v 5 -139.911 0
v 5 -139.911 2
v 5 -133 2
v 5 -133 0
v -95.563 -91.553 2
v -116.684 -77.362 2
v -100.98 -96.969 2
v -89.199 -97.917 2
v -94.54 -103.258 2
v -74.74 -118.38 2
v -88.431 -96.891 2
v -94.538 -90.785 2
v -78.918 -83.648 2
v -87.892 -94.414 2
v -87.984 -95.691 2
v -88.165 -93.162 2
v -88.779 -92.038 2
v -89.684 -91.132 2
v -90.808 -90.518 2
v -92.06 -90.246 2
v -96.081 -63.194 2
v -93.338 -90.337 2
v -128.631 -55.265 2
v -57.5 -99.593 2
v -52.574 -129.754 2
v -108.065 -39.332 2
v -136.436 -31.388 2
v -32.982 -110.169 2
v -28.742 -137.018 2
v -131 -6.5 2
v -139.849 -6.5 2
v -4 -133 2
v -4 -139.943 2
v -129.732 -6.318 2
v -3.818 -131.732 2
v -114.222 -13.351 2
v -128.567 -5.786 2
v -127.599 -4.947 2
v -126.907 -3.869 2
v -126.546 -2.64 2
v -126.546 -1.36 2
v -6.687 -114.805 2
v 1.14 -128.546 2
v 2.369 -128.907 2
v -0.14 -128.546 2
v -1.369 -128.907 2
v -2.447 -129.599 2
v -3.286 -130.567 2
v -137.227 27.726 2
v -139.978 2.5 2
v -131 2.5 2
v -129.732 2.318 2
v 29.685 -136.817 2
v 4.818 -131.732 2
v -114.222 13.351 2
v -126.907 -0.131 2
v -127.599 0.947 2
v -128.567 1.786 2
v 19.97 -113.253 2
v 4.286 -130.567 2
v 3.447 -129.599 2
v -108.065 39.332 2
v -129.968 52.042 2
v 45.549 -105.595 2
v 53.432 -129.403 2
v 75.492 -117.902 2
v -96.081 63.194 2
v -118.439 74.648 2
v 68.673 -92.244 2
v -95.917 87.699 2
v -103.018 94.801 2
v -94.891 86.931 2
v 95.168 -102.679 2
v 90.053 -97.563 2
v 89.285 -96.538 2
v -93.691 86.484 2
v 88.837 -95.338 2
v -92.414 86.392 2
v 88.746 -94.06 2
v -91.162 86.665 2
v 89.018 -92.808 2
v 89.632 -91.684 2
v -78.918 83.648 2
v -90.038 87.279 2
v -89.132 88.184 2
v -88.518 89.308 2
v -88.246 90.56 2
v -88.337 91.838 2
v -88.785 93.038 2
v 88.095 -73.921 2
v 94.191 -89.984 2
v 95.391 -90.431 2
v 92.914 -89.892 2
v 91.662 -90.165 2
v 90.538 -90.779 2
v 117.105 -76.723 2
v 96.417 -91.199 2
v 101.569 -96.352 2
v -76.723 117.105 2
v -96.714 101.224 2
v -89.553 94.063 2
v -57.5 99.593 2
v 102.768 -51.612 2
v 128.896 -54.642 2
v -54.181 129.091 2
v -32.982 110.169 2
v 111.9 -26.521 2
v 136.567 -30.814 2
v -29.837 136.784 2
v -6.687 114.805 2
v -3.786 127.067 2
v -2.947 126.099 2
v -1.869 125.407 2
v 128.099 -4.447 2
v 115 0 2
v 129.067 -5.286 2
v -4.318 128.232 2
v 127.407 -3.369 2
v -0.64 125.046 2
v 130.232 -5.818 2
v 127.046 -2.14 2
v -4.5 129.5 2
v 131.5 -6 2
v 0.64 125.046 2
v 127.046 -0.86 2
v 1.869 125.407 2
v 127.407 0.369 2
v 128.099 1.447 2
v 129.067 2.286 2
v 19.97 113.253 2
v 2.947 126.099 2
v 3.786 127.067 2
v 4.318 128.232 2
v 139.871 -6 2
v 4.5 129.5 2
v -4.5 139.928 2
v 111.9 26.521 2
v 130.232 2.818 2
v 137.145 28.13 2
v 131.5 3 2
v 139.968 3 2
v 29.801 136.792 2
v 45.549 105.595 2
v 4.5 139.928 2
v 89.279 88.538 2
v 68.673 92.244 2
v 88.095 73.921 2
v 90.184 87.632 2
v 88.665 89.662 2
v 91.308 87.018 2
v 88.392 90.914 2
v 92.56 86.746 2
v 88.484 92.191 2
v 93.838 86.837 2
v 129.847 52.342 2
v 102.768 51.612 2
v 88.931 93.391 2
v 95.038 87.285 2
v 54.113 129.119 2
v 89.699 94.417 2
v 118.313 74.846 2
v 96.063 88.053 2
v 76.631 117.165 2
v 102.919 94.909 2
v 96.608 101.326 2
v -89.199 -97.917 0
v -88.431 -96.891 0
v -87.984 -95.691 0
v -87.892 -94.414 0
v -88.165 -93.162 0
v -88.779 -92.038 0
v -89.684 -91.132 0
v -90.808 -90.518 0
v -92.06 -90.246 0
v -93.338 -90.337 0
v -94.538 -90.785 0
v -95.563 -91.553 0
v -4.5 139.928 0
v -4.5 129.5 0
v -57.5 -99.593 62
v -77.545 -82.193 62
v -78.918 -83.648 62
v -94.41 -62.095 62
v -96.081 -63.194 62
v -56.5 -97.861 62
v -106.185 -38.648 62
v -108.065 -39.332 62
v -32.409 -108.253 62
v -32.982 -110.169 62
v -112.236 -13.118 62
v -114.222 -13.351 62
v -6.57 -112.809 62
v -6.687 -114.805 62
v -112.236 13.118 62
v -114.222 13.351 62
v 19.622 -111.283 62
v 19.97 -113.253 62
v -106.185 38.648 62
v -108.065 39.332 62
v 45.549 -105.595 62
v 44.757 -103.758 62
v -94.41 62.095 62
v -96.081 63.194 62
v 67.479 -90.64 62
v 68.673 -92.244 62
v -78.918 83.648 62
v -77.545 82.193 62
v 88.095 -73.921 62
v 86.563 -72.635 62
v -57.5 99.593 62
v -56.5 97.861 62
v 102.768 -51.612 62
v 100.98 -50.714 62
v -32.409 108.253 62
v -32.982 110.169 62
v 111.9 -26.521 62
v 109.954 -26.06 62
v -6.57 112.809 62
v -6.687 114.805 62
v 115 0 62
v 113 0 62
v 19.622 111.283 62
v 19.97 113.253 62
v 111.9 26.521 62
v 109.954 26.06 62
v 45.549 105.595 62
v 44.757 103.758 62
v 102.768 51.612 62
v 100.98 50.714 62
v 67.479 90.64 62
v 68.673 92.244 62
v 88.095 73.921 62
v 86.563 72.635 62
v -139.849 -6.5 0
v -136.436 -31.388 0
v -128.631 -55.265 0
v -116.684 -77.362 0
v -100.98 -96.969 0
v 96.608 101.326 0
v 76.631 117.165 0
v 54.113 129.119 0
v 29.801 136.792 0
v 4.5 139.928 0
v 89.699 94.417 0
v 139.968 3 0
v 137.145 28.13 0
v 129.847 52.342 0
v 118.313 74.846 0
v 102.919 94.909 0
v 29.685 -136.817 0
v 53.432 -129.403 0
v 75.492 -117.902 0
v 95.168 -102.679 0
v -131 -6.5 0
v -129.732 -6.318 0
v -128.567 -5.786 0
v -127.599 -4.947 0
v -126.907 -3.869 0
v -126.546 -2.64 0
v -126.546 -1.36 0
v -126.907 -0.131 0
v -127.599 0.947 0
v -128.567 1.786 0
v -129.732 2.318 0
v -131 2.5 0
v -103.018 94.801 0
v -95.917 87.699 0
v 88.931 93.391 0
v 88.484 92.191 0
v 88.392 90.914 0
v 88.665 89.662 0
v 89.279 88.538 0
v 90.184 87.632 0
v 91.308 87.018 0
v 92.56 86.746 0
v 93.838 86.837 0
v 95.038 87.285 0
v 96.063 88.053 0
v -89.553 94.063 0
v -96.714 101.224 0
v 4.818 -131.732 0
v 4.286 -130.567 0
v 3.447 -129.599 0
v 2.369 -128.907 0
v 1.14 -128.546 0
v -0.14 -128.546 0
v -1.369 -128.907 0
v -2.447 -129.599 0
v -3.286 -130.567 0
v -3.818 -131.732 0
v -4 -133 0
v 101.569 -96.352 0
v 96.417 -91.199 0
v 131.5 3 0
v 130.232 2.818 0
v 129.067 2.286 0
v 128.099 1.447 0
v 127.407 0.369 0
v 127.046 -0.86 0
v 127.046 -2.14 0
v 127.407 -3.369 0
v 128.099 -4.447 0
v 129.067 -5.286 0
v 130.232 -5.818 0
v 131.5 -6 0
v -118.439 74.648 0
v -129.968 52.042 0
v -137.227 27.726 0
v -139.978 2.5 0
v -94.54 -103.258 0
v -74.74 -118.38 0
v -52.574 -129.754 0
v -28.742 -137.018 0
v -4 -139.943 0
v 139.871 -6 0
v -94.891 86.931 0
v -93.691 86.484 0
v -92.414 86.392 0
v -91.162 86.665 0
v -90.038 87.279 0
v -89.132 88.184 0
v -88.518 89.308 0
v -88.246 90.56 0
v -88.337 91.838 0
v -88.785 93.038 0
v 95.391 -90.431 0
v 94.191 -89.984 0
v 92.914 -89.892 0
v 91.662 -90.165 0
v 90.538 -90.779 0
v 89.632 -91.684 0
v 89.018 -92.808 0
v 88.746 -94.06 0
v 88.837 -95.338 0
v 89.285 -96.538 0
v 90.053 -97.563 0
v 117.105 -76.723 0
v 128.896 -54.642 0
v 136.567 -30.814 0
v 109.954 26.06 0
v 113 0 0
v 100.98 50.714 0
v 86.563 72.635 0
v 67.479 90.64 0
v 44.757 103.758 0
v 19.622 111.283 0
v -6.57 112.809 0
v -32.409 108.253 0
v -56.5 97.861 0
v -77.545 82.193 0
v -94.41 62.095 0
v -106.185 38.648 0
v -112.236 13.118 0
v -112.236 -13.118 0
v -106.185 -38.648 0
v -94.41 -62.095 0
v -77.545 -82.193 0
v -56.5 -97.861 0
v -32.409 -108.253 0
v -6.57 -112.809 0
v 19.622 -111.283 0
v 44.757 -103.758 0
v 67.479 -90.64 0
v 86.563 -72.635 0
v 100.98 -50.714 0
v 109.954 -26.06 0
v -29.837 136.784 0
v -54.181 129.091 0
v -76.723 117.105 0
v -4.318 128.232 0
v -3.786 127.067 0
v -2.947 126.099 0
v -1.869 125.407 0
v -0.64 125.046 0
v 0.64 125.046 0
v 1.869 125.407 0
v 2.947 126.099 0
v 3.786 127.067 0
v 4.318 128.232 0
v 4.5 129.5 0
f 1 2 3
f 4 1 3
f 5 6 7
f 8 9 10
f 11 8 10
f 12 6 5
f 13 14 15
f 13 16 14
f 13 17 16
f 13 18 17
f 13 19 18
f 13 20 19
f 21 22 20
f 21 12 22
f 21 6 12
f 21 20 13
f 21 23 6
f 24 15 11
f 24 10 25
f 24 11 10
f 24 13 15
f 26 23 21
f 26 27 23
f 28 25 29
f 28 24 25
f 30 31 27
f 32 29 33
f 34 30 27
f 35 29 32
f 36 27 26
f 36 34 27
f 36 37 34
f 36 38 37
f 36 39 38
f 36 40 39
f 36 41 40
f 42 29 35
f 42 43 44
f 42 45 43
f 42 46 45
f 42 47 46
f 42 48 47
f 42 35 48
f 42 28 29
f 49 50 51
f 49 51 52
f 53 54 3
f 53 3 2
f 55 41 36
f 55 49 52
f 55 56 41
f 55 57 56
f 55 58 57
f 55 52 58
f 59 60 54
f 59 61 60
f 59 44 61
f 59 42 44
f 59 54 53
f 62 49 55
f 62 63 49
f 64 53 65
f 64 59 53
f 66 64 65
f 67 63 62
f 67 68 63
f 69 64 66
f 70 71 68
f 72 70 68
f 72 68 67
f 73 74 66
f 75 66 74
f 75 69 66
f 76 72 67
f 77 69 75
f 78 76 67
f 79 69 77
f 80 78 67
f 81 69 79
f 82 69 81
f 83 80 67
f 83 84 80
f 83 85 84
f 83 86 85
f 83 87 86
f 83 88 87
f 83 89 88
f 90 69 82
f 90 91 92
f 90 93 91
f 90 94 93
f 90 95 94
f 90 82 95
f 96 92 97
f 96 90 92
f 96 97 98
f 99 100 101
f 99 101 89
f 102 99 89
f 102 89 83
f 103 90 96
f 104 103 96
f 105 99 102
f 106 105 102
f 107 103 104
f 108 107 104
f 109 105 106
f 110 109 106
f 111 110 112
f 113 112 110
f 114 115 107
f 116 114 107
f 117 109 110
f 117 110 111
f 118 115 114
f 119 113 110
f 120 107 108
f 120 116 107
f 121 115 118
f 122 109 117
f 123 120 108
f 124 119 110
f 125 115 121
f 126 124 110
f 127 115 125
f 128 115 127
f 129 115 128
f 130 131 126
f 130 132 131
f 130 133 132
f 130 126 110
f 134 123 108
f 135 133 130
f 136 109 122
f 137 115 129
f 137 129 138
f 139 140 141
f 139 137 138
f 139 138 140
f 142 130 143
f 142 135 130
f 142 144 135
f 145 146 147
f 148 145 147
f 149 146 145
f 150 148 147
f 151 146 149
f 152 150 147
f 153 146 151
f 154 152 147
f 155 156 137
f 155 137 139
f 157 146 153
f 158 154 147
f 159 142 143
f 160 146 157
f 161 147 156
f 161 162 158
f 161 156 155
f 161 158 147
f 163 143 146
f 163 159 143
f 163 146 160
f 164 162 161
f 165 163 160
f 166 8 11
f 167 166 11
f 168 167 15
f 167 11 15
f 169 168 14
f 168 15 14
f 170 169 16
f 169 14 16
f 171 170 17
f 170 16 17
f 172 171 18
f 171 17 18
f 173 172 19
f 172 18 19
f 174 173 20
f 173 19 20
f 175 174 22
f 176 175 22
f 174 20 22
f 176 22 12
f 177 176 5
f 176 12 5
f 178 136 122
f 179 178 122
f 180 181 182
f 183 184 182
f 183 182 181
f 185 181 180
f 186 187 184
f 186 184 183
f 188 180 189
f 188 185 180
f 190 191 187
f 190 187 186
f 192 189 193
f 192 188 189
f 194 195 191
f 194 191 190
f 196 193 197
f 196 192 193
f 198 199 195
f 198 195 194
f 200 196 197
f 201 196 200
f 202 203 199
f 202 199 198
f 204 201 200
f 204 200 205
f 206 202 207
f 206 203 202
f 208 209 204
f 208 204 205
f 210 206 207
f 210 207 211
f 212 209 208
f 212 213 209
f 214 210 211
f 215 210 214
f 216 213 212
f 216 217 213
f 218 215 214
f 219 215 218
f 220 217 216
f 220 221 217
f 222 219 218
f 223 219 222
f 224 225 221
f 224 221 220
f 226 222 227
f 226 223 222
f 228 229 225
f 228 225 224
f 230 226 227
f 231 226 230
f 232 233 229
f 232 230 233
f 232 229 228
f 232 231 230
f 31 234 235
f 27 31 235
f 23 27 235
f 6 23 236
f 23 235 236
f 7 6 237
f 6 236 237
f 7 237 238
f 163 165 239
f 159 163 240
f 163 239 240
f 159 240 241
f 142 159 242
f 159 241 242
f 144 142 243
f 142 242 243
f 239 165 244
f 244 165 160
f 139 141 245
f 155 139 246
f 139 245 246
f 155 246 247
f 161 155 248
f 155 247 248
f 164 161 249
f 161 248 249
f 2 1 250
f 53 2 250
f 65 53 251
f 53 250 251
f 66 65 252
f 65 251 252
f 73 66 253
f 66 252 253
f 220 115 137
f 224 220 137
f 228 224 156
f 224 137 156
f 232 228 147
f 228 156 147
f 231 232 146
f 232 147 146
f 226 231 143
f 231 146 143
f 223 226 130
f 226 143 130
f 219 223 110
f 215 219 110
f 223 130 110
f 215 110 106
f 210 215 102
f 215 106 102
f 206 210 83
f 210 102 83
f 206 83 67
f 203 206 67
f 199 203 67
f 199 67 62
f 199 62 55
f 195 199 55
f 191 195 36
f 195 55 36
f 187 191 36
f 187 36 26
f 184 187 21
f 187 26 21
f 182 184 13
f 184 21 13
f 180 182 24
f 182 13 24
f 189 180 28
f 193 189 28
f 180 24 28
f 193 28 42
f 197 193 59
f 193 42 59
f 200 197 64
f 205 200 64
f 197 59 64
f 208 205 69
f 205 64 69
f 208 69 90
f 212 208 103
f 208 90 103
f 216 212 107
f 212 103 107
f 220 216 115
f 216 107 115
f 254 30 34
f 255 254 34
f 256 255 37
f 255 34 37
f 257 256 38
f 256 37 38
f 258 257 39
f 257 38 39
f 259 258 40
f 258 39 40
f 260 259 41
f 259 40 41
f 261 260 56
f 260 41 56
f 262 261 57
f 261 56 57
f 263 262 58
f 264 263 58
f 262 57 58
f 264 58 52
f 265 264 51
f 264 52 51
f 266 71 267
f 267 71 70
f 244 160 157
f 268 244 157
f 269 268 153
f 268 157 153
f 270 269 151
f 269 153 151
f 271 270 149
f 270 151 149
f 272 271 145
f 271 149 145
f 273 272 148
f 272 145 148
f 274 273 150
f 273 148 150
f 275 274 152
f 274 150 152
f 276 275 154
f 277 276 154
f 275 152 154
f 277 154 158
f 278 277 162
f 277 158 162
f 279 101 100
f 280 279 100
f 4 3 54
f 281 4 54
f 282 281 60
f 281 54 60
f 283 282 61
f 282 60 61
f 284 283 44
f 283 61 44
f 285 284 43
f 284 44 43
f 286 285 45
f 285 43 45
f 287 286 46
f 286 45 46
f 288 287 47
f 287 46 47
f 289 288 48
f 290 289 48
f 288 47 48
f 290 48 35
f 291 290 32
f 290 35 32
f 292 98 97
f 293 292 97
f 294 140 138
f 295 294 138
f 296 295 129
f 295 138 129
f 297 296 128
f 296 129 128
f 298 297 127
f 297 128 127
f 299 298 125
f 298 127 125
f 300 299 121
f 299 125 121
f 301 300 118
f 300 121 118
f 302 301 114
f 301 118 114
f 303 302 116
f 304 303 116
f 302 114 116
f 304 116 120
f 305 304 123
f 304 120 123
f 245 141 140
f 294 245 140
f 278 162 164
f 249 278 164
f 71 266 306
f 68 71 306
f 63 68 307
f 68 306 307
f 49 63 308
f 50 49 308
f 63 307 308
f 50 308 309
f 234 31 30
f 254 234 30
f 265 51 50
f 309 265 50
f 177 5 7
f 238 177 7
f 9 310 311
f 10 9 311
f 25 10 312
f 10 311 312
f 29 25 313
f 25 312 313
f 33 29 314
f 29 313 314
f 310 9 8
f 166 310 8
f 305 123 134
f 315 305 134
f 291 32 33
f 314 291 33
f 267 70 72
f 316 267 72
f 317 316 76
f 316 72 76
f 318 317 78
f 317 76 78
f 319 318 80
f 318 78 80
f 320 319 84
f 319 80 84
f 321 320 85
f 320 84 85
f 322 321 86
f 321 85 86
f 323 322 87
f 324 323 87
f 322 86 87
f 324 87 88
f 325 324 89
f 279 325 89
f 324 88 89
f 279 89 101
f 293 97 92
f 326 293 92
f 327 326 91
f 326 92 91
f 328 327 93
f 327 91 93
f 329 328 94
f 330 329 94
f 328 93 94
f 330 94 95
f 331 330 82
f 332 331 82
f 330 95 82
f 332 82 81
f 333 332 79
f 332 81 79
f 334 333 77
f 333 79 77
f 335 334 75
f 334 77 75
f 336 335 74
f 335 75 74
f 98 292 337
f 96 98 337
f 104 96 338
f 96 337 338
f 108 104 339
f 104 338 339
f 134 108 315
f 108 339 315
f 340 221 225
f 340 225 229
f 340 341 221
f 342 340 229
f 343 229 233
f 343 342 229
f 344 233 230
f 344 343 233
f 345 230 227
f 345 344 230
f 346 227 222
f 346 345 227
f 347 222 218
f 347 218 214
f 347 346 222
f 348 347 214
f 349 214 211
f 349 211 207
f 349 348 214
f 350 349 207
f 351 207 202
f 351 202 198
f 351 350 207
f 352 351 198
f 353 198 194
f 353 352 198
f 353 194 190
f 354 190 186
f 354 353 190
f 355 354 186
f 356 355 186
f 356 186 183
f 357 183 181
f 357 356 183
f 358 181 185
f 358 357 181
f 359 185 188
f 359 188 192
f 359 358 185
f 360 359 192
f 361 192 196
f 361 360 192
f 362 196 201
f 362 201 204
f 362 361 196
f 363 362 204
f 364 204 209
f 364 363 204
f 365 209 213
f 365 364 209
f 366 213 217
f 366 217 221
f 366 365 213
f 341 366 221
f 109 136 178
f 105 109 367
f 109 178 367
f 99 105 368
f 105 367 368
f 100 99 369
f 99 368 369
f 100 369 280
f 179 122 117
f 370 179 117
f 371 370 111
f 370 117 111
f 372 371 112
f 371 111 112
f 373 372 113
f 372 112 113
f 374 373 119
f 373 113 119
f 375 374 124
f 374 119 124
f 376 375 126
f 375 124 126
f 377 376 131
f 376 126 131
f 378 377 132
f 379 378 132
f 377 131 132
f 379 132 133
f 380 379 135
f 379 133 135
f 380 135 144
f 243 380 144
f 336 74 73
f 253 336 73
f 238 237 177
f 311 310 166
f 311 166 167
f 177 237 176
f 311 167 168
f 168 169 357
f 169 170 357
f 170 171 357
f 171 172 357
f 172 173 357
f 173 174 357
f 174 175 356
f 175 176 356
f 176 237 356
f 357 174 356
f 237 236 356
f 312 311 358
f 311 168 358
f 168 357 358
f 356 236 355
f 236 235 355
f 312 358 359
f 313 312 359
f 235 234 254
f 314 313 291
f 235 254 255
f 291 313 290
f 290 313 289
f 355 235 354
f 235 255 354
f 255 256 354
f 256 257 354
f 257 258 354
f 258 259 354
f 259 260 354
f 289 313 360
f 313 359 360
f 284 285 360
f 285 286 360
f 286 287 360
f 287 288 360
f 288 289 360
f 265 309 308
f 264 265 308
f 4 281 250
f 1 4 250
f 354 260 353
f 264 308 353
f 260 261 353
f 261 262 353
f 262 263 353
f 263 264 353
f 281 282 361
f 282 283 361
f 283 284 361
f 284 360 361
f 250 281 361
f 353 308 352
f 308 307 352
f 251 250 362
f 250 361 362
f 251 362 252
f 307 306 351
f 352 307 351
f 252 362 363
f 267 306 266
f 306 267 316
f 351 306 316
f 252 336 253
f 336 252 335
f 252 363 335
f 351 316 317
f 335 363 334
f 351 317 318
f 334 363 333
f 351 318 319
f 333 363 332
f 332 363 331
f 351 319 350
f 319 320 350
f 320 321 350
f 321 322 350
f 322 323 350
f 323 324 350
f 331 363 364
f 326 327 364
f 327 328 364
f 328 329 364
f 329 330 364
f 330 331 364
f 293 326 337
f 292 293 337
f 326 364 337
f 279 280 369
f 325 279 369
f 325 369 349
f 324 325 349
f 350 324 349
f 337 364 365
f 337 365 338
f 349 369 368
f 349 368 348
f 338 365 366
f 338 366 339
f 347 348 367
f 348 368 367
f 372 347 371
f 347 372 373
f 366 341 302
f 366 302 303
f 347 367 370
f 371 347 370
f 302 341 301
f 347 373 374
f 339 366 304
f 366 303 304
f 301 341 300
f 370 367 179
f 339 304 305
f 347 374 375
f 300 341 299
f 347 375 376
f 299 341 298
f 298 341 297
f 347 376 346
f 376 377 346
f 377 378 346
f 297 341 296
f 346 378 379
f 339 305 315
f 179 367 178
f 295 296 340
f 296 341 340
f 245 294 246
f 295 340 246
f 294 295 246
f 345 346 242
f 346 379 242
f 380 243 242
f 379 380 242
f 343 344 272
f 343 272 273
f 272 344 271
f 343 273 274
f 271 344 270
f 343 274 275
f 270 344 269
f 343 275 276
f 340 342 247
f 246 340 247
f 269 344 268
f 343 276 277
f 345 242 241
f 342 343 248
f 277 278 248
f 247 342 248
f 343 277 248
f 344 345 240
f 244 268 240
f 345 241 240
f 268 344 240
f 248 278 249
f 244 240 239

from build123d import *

# Parameters (mm, degrees)
F0_R     = 140
F0_R_2   = 113
F1_DEPTH = 2
F2_R     = 115
F2_R_2   = 113
F3_DEPTH = 60
F5_DEPTH = 2.001


with BuildPart() as f1:
    # F0 (on Top) → F1 (new body)
    with BuildSketch(Plane.XY):
        Circle(F0_R)
        Circle(F0_R_2, mode=Mode.SUBTRACT)
    extrude(amount=F1_DEPTH)

    # F2 (on face) → F3 (join)
    with BuildSketch(Plane.XY.offset(2)):
        Circle(F2_R)
        Circle(F2_R_2, mode=Mode.SUBTRACT)
    extrude(amount=F3_DEPTH)

    # F4 (on face) → F5 (cut, through all)
    with BuildSketch(Plane.XY.offset(2)):
        with BuildLine():
            ThreePointArc((-4.5, 129.5), (0, 125), (4.5, 129.5))
            Line((4.5, 129.5), (4.5, 139.9276598818))
            ThreePointArc((4.5, 139.9276598818), (2.2502907086, 139.9819138022), (0, 140))
            ThreePointArc((0, 140), (-2.2502907086, 139.9819138022), (-4.5, 139.9276598818))
            Line((-4.5, 139.9276598818), (-4.5, 129.5))
        make_face()
        with BuildLine():
            ThreePointArc((102.9190976917, 94.9086894353), (99.8151721136, 98.1678736448), (96.6080873732, 101.3256011781))
            Line((96.6080873732, 101.3256011781), (89.6990082559, 94.4165220608))
            ThreePointArc((89.6990082559, 94.4165220608), (89.6990082559, 88.0525610302), (96.0629692866, 88.0525610302))
            Line((96.0629692866, 88.0525610302), (102.9190976917, 94.9086894353))
        make_face()
        with BuildLine():
            ThreePointArc((140, 0), (139.9919631357, 1.500085806), (139.9678534654, 2.9999993836))
            Line((139.9678534654, 2.9999993836), (131.5000006164, 2.9999993836))
            ThreePointArc((131.5000006164, 2.9999993836), (127.0000006164, -1.5000006164), (131.5000006164, -6.0000006164))
            Line((131.5000006164, -6.0000006164), (139.8713694528, -6.0000006164))
            ThreePointArc((139.8713694528, -6.0000006164), (139.9678386691, -3.000689638), (140, 0))
        make_face()
        with BuildLine():
            ThreePointArc((95.1684959742, -102.6789042307), (98.41976806, -99.5668079985), (101.5693267645, -96.3518129596))
            Line((101.5693267645, -96.3518129596), (96.4165226772, -91.1990088723))
            ThreePointArc((96.4165226772, -91.1990088723), (90.0525616465, -91.1990088723), (90.0525616465, -97.562969903))
            Line((90.0525616465, -97.562969903), (95.1684959742, -102.6789042306))
        make_face()
        with BuildLine():
            Line((-4, -133.0000012327), (-4, -139.9428454763))
            ThreePointArc((-4, -139.9428454763), (0.5002584944, -139.9991062166), (5, -139.9106857963))
            Line((5, -139.9106857963), (5, -133.0000012327))
            ThreePointArc((5, -133.0000012327), (0.5, -128.5000012327), (-4, -133.0000012327))
        make_face()
        with BuildLine():
            Line((-95.5629692866, -91.5525622629), (-100.97984248, -96.9694354563))
            ThreePointArc((-100.97984248, -96.9694354563), (-97.8105621043, -100.1653330292), (-94.5401870301, -103.2577020677))
            Line((-94.5401870301, -103.2577020677), (-89.1990082559, -97.9165232936))
            ThreePointArc((-89.1990082559, -97.9165232936), (-89.1990082559, -91.5525622629), (-95.5629692866, -91.5525622629))
        make_face()
        with BuildLine():
            Line((-131.0000006164, 2.4999993836), (-139.9776768027, 2.4999993836))
            ThreePointArc((-139.9776768027, 2.4999993836), (-139.9856987687, -2.0010347926), (-139.8490257098, -6.5000006164))
            Line((-139.8490257098, -6.5000006164), (-131.0000006164, -6.5000006164))
            ThreePointArc((-131.0000006164, -6.5000006164), (-126.5000006164, -2.0000006164), (-131.0000006164, 2.4999993836))
        make_face()
        with BuildLine():
            Line((-89.5525616465, 94.0629686703), (-96.7140546298, 101.2244616536))
            ThreePointArc((-96.7140546298, 101.2244616536), (-99.9178627776, 98.063350432), (-103.01840372, 94.8008886824))
            Line((-103.01840372, 94.8008886824), (-95.9165226772, 87.6990076396))
            ThreePointArc((-95.9165226772, 87.6990076396), (-89.5525616465, 87.6990076396), (-89.5525616465, 94.0629686703))
        make_face()
    extrude(amount=-F5_DEPTH, mode=Mode.SUBTRACT)


solid = f1.part
